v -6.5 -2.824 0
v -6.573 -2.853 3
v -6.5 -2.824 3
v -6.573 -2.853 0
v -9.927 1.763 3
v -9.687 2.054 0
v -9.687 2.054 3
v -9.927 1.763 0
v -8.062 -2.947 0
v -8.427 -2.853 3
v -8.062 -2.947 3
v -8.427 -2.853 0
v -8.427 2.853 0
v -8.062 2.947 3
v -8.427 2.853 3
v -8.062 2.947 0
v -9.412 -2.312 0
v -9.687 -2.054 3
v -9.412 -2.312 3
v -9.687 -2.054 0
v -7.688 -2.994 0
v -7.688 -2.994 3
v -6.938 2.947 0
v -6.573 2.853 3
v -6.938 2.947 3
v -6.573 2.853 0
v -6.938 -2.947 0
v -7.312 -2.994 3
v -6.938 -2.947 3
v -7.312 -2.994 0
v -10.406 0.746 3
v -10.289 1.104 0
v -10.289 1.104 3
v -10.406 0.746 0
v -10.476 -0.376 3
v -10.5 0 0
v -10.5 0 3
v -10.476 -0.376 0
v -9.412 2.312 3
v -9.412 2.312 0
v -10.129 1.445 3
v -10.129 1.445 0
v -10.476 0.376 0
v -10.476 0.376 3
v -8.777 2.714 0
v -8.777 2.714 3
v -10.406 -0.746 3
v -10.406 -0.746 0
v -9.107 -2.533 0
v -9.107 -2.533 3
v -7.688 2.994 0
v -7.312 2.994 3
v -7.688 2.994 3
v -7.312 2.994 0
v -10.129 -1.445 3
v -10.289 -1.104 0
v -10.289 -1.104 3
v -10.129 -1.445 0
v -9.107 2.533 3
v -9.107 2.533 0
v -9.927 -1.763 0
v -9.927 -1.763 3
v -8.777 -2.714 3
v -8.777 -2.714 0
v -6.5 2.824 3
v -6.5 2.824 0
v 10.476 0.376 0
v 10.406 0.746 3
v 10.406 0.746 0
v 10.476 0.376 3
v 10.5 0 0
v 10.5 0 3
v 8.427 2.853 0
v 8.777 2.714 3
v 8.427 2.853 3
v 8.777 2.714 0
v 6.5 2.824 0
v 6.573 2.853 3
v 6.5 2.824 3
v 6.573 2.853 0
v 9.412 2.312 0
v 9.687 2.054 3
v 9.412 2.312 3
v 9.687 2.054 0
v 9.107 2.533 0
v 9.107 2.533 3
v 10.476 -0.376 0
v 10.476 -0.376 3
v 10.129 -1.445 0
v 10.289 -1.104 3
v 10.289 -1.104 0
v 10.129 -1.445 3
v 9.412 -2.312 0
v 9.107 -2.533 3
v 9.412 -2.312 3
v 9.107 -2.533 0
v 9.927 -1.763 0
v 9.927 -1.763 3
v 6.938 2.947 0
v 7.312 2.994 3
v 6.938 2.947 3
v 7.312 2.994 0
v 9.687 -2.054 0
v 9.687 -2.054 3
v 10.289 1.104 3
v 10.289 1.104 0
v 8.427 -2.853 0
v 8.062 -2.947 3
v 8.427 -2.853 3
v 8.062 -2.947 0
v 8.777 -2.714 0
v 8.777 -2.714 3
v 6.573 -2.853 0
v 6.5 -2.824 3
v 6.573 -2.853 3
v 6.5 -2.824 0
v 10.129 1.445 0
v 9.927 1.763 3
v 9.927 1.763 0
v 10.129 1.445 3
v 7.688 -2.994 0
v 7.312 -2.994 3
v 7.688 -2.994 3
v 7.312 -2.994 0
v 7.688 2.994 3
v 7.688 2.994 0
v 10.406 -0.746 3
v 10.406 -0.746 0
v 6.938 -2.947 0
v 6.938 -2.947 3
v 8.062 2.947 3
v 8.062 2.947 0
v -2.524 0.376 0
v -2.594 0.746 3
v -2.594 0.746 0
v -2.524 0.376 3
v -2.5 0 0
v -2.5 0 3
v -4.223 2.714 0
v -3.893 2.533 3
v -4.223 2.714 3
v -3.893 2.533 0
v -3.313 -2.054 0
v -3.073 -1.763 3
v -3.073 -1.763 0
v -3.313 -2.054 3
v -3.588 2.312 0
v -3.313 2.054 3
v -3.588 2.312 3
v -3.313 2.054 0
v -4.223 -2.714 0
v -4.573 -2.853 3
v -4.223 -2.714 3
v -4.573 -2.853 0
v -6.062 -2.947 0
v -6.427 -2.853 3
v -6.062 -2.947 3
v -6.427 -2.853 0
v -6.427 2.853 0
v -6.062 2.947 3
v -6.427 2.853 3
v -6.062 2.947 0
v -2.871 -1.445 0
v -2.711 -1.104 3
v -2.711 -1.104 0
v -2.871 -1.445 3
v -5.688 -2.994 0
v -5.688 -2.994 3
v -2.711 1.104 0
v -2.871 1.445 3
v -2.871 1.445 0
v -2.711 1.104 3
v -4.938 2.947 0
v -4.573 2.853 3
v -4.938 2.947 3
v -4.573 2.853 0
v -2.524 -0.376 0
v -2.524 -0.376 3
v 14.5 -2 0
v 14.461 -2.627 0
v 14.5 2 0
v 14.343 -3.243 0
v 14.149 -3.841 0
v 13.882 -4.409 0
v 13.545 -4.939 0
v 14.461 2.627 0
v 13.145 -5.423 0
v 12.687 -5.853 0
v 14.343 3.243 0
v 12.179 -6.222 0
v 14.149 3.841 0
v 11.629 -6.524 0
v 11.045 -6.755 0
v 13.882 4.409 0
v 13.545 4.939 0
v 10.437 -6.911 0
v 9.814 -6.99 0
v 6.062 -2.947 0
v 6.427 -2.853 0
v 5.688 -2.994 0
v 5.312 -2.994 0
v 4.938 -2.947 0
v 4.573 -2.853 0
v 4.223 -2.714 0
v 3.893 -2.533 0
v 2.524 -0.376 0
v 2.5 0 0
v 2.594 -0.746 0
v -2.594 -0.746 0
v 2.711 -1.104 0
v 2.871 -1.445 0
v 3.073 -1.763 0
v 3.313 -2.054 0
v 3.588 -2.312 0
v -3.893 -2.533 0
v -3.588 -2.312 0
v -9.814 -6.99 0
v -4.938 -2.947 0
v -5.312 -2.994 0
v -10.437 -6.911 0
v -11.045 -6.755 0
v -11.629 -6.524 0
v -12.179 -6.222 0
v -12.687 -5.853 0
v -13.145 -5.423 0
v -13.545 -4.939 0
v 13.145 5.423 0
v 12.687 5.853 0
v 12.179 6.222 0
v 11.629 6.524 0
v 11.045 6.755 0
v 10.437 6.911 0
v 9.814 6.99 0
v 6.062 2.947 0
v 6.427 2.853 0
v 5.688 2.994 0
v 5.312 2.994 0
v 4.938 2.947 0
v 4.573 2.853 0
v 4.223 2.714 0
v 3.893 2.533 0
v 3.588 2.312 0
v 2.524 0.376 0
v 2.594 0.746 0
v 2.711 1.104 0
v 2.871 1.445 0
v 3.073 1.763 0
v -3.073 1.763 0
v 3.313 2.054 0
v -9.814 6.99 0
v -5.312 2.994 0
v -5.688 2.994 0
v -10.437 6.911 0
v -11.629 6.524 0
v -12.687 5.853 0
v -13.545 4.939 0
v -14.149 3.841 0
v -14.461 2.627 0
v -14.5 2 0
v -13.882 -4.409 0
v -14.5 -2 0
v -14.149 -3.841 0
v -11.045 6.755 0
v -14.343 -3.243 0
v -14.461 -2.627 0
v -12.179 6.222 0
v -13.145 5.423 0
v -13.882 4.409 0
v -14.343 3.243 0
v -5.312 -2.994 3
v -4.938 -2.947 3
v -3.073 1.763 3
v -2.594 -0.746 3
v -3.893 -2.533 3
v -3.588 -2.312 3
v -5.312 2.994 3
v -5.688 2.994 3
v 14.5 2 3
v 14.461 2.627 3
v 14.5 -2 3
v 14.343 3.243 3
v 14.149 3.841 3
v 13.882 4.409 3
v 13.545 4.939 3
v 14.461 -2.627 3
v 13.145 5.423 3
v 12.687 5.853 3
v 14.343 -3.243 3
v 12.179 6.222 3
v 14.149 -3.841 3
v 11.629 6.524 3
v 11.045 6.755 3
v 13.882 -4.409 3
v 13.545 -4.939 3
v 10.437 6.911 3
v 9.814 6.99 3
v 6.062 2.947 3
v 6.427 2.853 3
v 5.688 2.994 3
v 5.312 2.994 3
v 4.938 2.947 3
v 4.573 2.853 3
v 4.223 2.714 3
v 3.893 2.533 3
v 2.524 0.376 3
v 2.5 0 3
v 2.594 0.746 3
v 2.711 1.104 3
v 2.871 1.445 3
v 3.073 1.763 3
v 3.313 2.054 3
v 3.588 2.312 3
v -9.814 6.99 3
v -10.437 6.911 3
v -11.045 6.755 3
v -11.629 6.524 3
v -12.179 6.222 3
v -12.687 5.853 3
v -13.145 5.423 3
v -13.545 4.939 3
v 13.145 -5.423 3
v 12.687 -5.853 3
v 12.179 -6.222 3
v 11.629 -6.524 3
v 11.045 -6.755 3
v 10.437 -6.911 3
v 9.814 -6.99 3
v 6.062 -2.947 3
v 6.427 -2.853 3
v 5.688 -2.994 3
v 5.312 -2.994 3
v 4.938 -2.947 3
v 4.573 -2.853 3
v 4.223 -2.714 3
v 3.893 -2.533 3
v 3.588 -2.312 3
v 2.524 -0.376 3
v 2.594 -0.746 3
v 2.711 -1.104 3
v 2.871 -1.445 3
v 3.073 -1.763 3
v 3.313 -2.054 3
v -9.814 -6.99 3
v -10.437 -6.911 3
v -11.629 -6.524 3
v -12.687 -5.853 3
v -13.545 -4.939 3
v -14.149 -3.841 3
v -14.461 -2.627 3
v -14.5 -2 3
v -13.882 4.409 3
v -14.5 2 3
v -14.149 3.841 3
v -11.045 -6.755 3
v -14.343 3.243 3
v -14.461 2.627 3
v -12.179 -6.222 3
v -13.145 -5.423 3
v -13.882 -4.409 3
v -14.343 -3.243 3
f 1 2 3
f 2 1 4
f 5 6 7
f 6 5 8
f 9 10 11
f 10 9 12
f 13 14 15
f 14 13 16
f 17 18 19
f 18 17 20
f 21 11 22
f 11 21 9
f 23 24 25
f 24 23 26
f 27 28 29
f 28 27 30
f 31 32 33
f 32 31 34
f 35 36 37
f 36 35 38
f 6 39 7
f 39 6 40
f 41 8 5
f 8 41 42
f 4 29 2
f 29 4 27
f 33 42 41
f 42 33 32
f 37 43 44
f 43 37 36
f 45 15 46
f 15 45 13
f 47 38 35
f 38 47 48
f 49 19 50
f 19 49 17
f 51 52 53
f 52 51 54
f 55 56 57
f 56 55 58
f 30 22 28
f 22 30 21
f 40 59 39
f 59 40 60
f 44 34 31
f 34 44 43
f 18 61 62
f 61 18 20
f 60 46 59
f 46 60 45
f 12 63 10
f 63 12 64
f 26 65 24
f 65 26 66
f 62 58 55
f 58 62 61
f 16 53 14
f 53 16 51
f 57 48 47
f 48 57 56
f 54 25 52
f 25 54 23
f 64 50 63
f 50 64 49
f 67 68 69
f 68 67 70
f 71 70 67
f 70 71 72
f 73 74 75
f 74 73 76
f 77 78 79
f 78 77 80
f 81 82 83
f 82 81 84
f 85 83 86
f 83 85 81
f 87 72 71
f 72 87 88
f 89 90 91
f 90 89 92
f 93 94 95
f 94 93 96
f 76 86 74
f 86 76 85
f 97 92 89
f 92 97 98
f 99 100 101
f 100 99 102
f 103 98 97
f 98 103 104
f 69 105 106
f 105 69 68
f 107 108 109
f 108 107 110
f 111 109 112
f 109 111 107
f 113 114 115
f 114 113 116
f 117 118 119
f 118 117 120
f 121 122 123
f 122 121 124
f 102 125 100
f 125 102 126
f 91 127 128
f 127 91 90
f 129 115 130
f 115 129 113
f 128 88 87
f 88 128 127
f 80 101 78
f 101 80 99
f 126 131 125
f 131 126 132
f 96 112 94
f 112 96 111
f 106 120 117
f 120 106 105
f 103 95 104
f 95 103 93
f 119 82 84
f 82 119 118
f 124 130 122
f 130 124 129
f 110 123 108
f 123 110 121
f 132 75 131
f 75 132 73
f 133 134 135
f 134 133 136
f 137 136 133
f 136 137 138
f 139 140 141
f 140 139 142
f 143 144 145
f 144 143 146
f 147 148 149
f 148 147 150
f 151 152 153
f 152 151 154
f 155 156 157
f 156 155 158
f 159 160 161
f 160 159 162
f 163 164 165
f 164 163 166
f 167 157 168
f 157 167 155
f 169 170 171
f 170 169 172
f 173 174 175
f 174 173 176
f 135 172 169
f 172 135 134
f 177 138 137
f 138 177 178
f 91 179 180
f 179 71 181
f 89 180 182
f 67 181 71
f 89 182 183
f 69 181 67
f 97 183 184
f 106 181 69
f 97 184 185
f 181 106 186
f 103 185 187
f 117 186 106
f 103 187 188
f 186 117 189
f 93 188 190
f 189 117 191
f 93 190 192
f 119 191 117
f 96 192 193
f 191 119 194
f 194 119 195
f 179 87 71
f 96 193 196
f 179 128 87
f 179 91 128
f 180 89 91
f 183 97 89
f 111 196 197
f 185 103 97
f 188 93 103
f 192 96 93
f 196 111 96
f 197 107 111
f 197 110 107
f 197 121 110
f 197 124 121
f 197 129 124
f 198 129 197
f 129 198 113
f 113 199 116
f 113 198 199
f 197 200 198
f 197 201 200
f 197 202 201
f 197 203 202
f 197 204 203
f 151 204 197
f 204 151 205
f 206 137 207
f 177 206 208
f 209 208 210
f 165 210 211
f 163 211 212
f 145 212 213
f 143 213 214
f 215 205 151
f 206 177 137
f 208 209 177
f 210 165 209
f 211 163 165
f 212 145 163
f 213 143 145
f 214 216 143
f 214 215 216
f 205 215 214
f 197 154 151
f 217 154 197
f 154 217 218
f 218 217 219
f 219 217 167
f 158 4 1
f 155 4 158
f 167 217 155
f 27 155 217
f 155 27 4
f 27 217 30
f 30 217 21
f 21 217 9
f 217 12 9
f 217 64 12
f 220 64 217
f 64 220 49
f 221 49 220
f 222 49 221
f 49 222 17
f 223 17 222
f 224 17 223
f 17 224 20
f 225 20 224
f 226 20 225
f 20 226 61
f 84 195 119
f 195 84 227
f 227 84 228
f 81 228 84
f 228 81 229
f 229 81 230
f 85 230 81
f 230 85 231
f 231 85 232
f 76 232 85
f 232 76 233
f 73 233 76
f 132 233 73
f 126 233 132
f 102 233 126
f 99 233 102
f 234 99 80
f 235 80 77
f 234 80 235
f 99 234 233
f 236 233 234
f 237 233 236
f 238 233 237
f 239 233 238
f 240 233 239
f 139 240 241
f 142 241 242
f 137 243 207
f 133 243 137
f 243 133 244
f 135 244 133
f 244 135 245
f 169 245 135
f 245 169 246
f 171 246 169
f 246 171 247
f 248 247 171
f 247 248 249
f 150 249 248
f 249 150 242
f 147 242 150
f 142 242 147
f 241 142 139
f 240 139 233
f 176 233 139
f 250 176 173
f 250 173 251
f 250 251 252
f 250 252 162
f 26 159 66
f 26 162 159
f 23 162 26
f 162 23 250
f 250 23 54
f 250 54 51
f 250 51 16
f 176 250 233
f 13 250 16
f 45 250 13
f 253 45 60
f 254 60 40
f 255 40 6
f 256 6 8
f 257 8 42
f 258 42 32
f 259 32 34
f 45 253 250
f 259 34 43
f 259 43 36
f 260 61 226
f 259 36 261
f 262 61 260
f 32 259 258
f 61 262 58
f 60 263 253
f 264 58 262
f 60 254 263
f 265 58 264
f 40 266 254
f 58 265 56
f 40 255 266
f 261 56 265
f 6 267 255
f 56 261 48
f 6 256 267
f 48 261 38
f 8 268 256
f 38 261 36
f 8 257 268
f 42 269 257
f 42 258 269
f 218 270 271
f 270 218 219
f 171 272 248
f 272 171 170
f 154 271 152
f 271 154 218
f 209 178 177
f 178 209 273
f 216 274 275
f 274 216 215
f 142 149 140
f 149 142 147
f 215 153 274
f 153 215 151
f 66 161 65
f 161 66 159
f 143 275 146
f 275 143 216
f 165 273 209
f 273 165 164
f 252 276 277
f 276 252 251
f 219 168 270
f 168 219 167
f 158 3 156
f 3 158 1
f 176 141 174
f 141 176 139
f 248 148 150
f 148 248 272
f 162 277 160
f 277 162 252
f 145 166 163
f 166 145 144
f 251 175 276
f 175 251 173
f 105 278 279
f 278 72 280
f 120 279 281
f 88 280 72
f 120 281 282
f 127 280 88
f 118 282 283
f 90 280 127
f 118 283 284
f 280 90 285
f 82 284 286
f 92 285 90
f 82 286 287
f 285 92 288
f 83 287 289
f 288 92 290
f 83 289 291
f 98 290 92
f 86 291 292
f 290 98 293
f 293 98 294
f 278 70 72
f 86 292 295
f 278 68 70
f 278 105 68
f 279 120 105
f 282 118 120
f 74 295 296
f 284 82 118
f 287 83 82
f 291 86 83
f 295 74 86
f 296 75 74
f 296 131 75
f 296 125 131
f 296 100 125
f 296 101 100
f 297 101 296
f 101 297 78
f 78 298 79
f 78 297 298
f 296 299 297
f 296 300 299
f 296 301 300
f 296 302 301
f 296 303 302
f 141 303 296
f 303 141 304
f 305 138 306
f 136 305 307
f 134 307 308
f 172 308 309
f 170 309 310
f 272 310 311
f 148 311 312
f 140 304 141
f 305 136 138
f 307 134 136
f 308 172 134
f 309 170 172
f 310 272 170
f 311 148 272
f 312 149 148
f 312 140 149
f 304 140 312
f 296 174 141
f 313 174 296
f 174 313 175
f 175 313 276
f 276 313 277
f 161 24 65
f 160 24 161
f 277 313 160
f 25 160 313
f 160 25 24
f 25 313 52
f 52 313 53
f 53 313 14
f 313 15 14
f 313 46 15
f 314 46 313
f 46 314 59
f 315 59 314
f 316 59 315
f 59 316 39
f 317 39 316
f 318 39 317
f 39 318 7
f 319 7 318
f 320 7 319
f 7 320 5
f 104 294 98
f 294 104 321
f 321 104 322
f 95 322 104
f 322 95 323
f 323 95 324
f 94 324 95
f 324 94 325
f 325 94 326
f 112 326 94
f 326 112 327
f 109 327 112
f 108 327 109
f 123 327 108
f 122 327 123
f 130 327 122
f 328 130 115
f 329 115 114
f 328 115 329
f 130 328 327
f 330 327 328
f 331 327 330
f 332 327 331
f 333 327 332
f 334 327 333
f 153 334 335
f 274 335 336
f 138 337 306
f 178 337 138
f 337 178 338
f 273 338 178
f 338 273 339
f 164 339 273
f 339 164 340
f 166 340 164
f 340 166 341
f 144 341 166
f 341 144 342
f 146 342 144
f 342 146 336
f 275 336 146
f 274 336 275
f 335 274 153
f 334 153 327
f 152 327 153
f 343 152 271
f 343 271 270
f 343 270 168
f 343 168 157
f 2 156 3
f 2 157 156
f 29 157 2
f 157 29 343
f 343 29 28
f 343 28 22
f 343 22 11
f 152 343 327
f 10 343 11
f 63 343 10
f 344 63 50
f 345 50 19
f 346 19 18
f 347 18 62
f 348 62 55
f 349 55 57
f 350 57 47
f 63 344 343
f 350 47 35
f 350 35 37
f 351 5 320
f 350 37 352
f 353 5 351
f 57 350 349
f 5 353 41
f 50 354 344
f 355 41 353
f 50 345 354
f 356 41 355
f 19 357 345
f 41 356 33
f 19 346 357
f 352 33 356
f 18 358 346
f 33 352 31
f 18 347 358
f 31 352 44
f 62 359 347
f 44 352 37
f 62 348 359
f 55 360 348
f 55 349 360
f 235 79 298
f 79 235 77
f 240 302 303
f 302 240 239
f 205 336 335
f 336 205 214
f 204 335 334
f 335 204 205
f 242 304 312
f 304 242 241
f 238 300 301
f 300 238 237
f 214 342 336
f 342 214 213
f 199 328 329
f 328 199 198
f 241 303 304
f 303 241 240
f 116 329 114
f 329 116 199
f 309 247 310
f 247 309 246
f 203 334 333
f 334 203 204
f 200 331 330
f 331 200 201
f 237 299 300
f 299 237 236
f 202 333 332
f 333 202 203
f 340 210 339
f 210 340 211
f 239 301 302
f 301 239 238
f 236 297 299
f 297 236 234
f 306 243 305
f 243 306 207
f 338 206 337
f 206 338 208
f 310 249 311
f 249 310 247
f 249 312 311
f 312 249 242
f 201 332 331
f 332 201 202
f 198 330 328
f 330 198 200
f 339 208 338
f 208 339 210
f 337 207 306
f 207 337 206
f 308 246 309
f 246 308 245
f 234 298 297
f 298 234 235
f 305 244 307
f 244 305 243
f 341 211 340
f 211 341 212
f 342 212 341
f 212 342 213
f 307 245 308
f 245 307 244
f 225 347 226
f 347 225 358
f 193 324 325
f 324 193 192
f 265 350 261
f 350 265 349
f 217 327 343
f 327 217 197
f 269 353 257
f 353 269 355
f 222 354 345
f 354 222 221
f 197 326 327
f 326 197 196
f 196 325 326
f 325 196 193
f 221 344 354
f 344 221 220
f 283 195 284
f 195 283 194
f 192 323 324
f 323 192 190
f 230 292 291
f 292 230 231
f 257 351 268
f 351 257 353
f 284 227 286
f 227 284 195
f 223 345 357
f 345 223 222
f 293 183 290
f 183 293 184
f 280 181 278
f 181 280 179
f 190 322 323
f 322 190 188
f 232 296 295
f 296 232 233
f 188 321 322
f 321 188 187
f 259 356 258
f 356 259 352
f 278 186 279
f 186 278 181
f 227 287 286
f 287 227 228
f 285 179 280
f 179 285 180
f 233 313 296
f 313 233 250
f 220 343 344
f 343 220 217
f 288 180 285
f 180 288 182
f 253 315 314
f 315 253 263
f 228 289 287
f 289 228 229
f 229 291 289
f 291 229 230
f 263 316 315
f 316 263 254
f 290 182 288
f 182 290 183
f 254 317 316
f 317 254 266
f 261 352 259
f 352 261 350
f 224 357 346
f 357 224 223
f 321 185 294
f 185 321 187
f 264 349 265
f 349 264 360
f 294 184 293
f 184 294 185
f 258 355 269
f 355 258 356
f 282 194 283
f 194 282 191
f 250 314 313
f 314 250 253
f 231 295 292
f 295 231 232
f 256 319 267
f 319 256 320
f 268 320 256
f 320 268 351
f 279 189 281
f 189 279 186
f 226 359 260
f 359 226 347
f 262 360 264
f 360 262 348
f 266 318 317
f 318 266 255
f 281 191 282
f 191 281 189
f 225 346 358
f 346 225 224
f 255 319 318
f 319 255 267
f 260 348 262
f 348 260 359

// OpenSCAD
$fn = 50;


difference() {
	union() {
		hull() {
			translate(v = [-9.5000000000, 2.0000000000, 0]) {
				cylinder(h = 3, r = 5);
			}
			translate(v = [9.5000000000, 2.0000000000, 0]) {
				cylinder(h = 3, r = 5);
			}
			translate(v = [-9.5000000000, -2.0000000000, 0]) {
				cylinder(h = 3, r = 5);
			}
			translate(v = [9.5000000000, -2.0000000000, 0]) {
				cylinder(h = 3, r = 5);
			}
		}
	}
	union() {
		#translate(v = [-7.5000000000, 0.0000000000, -100.0000000000]) {
			cylinder(h = 200, r = 3.0000000000);
		}
		#translate(v = [-7.5000000000, 0.0000000000, -100.0000000000]) {
			cylinder(h = 200, r = 3.0000000000);
		}
		#translate(v = [7.5000000000, 0.0000000000, -100.0000000000]) {
			cylinder(h = 200, r = 3.0000000000);
		}
		#translate(v = [7.5000000000, 0.0000000000, -100.0000000000]) {
			cylinder(h = 200, r = 3.0000000000);
		}
		#translate(v = [-5.5000000000, 0, 0]) {
			cylinder(h = 3, r = 3.0000000000);
		}
		#translate(v = [5.5000000000, 0, 0]) {
			cylinder(h = 3, r = 3.0000000000);
		}
	}
}
